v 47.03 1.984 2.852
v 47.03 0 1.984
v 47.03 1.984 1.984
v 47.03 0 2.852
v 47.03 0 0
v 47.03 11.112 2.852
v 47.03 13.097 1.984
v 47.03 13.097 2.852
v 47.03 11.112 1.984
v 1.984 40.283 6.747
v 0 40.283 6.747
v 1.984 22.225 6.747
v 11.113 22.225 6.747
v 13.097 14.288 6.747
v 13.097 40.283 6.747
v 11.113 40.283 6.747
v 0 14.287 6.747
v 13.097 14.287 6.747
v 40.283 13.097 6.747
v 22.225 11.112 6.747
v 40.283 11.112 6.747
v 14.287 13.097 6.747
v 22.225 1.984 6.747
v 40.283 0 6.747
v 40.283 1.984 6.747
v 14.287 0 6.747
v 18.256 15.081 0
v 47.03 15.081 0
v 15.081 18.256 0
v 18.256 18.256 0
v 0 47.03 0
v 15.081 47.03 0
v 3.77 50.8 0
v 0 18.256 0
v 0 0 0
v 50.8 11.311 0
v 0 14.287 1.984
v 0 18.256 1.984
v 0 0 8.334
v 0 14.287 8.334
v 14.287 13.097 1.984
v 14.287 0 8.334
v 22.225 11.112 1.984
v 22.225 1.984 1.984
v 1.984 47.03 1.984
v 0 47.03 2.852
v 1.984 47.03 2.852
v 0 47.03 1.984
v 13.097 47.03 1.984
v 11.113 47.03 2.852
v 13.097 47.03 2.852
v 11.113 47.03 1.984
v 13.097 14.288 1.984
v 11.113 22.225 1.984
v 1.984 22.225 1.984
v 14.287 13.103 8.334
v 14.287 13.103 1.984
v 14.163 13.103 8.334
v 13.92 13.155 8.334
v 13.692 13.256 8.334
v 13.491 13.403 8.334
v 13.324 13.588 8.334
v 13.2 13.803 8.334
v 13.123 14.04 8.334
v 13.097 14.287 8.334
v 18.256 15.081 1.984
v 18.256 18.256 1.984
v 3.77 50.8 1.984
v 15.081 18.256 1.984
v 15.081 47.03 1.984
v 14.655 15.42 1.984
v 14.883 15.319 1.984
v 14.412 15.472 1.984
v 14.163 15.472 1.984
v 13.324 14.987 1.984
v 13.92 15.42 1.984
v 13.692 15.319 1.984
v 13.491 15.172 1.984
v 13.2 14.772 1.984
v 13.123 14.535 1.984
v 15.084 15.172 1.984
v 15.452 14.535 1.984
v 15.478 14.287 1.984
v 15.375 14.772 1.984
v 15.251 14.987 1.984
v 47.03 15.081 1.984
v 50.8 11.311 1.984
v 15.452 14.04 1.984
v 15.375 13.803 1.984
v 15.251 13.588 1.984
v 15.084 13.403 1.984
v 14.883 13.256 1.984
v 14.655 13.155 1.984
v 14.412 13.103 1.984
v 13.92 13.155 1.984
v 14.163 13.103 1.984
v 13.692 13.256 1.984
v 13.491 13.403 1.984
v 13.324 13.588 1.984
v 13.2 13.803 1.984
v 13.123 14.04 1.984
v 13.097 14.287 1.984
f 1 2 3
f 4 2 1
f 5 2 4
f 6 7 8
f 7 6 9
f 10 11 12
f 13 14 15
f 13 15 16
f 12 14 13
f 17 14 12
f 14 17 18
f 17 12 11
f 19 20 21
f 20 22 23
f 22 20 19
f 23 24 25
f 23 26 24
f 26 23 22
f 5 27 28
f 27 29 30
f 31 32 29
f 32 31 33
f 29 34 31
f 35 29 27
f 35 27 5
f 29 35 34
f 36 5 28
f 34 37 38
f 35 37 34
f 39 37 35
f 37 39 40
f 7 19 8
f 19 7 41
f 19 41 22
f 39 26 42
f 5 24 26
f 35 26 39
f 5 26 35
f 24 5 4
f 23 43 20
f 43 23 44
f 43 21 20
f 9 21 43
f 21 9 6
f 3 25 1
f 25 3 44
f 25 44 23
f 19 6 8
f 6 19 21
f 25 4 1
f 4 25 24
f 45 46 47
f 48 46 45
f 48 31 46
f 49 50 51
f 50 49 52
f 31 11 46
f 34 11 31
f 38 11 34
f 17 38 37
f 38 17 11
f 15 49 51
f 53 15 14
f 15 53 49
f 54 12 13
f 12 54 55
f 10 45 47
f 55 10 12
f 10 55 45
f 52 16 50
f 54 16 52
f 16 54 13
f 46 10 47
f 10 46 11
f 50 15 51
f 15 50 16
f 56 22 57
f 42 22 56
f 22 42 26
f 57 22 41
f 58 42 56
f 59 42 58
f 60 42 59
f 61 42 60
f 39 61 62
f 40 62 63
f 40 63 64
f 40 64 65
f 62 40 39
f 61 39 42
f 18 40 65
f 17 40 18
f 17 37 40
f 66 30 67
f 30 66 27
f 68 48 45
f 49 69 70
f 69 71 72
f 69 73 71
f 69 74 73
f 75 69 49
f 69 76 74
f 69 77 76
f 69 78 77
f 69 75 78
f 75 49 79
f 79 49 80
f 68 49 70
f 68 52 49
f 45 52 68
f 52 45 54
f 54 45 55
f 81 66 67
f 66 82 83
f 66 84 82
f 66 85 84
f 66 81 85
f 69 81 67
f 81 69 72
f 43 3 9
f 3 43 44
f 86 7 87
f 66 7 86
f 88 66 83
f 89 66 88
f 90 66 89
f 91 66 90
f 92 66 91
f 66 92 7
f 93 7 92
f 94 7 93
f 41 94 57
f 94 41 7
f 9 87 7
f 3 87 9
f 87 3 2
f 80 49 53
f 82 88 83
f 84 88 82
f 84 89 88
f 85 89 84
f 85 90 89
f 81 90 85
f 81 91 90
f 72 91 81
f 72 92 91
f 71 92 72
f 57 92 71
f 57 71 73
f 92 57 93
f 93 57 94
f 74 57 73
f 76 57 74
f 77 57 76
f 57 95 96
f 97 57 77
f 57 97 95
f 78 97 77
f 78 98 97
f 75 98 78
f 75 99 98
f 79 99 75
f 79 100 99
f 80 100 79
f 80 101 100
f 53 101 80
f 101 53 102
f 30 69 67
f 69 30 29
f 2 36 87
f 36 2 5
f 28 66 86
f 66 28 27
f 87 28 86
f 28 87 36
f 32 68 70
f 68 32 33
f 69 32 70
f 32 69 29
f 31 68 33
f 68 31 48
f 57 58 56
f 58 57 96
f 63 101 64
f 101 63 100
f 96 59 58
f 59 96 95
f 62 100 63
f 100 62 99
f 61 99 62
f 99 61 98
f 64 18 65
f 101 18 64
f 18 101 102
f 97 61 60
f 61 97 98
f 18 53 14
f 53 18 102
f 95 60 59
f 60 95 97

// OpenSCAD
//window screen corners
in=25.4;

// long sides 19/32 x 5/64 x 2"
lsW = in*19/32;
lsH = in*5/64;
lsL = in*2;
lsCorner = lsW/4;

//corner square 3/4" x 3/4"
cW = in * 9/16;
cL = cW;
cH = in * 21/64;

//holding pins
pinBlockW = in * 33/64;    //width of pin block
pinGapW = in * 23/64;
pinL = 1*(lsL-lsCorner);
pinH = in * 17/64;
pinStart = in * 7/8; //where do the pins start
pinW = in * 5/64;

// inner corner bit is 5/32" square 
icW = in*5/32;
icL = icW;
icH = lsH;
icD = 2*(cW-pinBlockW);

module long_sides() {
    linear_extrude(height=lsH) {
        polygon(points=[[0,0], 
            [lsL-lsCorner, 0], // optional [lsL, lsCorner], 
            [lsL, lsW-lsCorner],
            [lsL-lsCorner, lsW],
            [0, lsW],
            [0,0]],
            convexity=1);
    }
}

module pins() {
   difference() {
       cube([pinL, pinBlockW, pinH]);
       translate([pinStart, (pinBlockW-pinGapW)/2, 0]) cube([pinL-pinStart, pinGapW, pinH]);
      # translate([pinL-pinH, 0, pinH]) rotate([0, 30, 0]) cube([pinBlockW, pinBlockW, pinBlockW]);
   }
}

module corner() {
    union() {
        cube([cW, cL, cH]);
        cube([cW+icW, cL+icL, icH]);
    }
}

difference() {
    union() {
        long_sides();
        translate([lsW, 0, 0]) rotate([0,0,90]) long_sides();
        pins();
        translate([lsW-(pinBlockW-pinGapW)/2, 0, 0]) rotate([0,0,90]) pins();
        corner();
    }
    translate([cW, cL, lsH]) cylinder(d=icD, h=cH, $fn=30);  
}
